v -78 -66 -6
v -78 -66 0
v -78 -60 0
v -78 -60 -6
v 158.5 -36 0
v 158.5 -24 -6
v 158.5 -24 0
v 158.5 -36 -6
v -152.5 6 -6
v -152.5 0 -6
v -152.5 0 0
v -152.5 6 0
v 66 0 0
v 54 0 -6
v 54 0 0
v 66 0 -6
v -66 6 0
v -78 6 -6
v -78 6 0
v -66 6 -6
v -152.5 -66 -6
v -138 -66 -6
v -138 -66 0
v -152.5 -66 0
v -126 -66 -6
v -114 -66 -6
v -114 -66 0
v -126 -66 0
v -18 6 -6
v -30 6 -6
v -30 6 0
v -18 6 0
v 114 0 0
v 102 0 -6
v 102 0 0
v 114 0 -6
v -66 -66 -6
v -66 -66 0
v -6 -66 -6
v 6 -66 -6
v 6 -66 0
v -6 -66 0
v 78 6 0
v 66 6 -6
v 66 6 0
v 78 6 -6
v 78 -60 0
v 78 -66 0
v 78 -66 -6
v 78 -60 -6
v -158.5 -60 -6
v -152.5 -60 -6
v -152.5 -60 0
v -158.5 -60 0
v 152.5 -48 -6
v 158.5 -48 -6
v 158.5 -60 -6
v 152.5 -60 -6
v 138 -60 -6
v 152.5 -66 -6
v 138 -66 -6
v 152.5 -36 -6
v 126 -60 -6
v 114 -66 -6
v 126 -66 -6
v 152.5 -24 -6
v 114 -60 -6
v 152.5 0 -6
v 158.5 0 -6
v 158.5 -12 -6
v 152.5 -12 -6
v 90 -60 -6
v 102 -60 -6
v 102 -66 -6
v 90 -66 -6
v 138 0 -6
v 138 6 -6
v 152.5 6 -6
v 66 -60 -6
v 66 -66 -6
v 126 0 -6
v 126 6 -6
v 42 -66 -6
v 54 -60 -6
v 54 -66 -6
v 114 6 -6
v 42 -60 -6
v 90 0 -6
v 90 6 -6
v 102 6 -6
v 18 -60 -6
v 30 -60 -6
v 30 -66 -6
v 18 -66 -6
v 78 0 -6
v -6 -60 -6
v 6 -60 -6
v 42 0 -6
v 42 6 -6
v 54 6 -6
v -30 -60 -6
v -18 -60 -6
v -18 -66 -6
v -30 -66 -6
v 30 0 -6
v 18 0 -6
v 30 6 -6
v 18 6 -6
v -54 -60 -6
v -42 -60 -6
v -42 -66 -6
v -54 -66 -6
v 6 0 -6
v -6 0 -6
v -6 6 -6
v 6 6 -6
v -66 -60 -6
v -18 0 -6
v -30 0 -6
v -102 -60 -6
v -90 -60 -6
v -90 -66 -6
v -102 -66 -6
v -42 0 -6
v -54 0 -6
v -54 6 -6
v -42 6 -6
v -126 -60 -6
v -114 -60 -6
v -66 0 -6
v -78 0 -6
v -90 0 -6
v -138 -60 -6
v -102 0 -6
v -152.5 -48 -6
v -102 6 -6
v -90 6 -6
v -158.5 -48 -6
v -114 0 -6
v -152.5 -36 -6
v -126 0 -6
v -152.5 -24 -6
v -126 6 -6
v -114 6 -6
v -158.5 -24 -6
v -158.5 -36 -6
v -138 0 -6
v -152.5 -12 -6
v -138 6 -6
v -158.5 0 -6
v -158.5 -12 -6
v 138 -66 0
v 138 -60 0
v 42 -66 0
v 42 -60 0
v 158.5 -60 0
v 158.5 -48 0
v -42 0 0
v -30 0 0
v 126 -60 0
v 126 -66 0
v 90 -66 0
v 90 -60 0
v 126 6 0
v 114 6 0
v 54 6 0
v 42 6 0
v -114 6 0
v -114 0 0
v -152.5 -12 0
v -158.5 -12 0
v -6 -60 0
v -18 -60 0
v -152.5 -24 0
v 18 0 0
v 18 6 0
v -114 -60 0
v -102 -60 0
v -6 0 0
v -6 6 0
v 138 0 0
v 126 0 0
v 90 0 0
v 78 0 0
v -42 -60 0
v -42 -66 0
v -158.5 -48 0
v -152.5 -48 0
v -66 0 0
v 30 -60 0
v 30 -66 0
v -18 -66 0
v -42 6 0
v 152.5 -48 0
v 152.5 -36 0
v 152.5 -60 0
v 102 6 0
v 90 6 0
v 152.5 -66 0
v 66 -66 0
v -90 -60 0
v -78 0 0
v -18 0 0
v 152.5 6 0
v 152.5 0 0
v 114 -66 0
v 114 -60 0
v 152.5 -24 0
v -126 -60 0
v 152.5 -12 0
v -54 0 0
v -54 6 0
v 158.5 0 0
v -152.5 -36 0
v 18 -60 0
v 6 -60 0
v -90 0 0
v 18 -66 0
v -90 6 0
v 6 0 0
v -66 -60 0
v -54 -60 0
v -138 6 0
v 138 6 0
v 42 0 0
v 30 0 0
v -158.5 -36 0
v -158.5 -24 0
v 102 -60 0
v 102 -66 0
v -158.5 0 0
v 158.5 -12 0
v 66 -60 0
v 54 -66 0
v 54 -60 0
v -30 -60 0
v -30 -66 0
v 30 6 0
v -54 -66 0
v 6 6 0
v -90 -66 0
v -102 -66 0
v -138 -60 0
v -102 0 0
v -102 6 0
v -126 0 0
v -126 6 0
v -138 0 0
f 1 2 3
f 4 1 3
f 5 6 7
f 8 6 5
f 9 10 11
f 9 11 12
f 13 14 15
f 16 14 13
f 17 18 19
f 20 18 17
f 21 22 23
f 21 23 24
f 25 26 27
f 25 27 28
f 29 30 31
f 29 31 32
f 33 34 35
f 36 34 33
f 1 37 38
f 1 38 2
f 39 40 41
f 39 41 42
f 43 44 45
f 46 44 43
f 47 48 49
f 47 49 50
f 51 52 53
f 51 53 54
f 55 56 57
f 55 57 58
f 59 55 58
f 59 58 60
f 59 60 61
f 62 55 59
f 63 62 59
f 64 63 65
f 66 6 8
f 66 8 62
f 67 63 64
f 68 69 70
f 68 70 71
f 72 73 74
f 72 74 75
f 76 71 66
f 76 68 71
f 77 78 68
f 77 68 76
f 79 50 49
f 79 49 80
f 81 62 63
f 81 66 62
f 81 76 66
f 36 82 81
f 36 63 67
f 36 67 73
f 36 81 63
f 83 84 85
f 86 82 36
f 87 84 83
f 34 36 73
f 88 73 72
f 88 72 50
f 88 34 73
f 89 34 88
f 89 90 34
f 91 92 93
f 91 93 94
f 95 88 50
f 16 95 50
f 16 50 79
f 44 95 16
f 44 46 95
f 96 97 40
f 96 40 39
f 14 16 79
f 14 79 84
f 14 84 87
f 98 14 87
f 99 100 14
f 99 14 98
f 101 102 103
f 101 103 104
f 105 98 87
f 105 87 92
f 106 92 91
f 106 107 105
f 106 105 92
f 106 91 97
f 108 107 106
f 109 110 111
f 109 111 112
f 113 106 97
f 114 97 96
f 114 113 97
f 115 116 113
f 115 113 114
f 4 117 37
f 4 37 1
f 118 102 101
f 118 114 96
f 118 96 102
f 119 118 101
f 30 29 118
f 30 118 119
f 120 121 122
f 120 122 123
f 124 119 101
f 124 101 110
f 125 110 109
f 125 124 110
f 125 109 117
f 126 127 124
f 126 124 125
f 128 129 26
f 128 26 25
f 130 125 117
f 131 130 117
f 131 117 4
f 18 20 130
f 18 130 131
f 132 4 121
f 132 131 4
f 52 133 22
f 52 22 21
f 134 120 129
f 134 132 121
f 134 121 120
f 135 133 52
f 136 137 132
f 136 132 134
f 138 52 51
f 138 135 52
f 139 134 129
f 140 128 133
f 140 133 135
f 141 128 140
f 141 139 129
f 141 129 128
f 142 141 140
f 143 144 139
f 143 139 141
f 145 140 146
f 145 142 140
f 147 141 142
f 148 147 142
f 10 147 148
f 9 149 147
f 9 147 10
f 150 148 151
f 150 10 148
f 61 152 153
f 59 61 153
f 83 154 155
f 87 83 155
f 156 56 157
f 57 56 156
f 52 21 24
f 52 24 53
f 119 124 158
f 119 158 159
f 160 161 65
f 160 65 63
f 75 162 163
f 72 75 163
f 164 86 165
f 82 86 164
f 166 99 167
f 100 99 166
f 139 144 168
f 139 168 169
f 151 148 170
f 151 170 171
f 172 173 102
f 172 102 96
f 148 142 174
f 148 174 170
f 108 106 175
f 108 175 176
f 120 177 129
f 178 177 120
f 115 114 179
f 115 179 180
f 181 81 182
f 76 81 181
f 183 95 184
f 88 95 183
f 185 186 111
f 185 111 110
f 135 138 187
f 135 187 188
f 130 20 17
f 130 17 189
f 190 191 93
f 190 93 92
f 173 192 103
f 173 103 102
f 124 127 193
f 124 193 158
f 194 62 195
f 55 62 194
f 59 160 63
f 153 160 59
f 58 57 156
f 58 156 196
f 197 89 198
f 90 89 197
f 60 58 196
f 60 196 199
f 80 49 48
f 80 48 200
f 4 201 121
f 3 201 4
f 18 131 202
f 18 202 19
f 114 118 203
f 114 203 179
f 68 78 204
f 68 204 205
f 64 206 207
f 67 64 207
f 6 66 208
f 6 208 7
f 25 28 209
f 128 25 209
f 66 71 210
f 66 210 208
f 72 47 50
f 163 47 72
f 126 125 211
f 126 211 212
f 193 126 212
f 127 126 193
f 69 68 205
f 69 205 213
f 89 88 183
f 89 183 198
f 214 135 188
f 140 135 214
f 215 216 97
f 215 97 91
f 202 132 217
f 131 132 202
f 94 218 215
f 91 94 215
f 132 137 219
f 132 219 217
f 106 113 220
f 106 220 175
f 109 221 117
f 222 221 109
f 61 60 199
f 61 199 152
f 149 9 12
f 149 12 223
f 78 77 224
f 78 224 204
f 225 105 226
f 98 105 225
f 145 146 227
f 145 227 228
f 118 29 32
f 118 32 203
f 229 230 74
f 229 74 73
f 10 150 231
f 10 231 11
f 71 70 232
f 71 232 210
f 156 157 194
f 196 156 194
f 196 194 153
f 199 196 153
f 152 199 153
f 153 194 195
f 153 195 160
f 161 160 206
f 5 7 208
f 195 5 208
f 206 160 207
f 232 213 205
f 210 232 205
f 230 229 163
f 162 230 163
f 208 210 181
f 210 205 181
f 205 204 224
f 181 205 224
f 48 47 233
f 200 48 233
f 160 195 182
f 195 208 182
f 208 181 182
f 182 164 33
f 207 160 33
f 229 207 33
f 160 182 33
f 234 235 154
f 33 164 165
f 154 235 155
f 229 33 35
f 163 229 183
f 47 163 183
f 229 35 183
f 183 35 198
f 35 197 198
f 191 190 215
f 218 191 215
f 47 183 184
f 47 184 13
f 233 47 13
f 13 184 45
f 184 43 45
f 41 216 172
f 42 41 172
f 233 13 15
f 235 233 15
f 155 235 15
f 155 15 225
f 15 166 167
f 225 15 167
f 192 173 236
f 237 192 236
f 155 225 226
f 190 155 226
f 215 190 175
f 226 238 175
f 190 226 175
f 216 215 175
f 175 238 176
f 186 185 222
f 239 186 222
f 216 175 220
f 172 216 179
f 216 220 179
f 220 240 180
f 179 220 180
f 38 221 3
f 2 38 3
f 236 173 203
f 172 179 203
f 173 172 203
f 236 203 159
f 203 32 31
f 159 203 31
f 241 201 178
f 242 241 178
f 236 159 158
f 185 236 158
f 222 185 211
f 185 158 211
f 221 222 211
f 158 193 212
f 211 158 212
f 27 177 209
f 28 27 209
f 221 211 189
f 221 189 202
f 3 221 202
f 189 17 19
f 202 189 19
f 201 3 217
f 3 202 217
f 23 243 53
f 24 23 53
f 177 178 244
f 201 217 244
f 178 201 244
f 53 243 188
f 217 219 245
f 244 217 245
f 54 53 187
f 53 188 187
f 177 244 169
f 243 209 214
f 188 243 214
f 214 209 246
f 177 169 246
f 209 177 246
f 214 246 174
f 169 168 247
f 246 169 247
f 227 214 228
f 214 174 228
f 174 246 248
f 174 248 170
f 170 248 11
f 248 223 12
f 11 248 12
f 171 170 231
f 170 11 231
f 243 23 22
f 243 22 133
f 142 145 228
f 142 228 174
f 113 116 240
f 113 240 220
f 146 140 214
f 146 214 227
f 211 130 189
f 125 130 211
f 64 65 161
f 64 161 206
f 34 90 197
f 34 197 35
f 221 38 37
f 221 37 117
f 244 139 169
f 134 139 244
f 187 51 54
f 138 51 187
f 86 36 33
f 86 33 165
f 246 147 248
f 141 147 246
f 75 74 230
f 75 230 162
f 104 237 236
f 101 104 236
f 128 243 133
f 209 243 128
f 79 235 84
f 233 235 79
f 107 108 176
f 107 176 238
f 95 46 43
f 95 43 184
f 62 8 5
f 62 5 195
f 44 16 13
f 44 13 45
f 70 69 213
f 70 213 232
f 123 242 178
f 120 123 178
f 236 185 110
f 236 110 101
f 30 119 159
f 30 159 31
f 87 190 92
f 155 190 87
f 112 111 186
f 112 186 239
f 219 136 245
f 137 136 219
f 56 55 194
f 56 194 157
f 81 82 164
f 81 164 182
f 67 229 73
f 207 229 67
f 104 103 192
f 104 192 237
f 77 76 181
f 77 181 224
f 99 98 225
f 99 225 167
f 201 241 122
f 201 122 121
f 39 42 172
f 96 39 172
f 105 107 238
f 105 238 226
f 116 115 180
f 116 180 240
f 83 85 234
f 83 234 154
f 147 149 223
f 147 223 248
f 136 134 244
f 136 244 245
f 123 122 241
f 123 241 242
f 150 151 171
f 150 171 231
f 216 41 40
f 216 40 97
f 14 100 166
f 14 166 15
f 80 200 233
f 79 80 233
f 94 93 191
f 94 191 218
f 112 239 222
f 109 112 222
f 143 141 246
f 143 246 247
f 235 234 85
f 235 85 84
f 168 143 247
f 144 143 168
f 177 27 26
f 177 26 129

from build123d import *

# Parameters (mm, degrees)
BOSS_EXTRUDE1_DEPTH = 6
SKETCH3_W           = 12
SKETCH3_H           = 6
CUT_EXTRUDE1_DEPTH  = 6


with BuildPart() as part:
    # Sketch2 → Boss-Extrude1 (new body)
    with BuildSketch(Plane.XY.offset(-6)):
        Polygon((-152.5, 6), (-138, 6), (-138, 0), (-126, 0), (-126, 6), (-114, 6), (-114, 0), (-102, 0), (-102, 6), (-90, 6), (-90, 0), (-78, 0), (-78, 6), (-66, 6), (-66, 0), (-54, 0), (-54, 6), (-42, 6), (-42, 0), (-30, 0), (-30, 6), (-18, 6), (-18, 0), (-6, 0), (-6, 6), (6, 6), (6, 0), (18, 0), (18, 6), (30, 6), (30, 0), (42, 0), (42, 6), (54, 6), (54, 0), (66, 0), (66, 6), (78, 6), (78, 0), (90, 0), (90, 6), (102, 6), (102, 0), (114, 0), (114, 6), (126, 6), (126, 0), (138, 0), (138, 6), (152.5, 6), (152.5, 0), (158.5, 0), (158.5, -12), (152.5, -12), (152.5, -24), (158.5, -24), (158.5, -36), (152.5, -36), (152.5, -48), (158.5, -48), (158.5, -60), (152.5, -60), (152.5, -66), (-152.5, -66), (-152.5, -60), (-158.5, -60), (-158.5, -48), (-152.5, -48), (-152.5, -36), (-158.5, -36), (-158.5, -24), (-152.5, -24), (-152.5, -12), (-158.5, -12), (-158.5, 0), (-152.5, 0), align=None)
    extrude(amount=BOSS_EXTRUDE1_DEPTH)

    # Sketch3 → Cut-Extrude1 (cut)
    with BuildSketch(Plane.XY):
        with Locations((-132, -63)):
            Rectangle(SKETCH3_W, SKETCH3_H)
        with Locations((-108, -63)):
            Rectangle(SKETCH3_W, SKETCH3_H)
        with Locations((-84, -63)):
            Rectangle(SKETCH3_W, SKETCH3_H)
        with Locations((-60, -63)):
            Rectangle(SKETCH3_W, SKETCH3_H)
        with Locations((-36, -63)):
            Rectangle(SKETCH3_W, SKETCH3_H)
        with Locations((-12, -63)):
            Rectangle(SKETCH3_W, SKETCH3_H)
        with Locations((12, -63)):
            Rectangle(SKETCH3_W, SKETCH3_H)
        with Locations((36, -63)):
            Rectangle(SKETCH3_W, SKETCH3_H)
        with Locations((60, -63)):
            Rectangle(SKETCH3_W, SKETCH3_H)
        with Locations((84, -63)):
            Rectangle(SKETCH3_W, SKETCH3_H)
        with Locations((108, -63)):
            Rectangle(SKETCH3_W, SKETCH3_H)
        with Locations((132, -63)):
            Rectangle(SKETCH3_W, SKETCH3_H)
    extrude(amount=-CUT_EXTRUDE1_DEPTH, mode=Mode.SUBTRACT)


solid = part.part
